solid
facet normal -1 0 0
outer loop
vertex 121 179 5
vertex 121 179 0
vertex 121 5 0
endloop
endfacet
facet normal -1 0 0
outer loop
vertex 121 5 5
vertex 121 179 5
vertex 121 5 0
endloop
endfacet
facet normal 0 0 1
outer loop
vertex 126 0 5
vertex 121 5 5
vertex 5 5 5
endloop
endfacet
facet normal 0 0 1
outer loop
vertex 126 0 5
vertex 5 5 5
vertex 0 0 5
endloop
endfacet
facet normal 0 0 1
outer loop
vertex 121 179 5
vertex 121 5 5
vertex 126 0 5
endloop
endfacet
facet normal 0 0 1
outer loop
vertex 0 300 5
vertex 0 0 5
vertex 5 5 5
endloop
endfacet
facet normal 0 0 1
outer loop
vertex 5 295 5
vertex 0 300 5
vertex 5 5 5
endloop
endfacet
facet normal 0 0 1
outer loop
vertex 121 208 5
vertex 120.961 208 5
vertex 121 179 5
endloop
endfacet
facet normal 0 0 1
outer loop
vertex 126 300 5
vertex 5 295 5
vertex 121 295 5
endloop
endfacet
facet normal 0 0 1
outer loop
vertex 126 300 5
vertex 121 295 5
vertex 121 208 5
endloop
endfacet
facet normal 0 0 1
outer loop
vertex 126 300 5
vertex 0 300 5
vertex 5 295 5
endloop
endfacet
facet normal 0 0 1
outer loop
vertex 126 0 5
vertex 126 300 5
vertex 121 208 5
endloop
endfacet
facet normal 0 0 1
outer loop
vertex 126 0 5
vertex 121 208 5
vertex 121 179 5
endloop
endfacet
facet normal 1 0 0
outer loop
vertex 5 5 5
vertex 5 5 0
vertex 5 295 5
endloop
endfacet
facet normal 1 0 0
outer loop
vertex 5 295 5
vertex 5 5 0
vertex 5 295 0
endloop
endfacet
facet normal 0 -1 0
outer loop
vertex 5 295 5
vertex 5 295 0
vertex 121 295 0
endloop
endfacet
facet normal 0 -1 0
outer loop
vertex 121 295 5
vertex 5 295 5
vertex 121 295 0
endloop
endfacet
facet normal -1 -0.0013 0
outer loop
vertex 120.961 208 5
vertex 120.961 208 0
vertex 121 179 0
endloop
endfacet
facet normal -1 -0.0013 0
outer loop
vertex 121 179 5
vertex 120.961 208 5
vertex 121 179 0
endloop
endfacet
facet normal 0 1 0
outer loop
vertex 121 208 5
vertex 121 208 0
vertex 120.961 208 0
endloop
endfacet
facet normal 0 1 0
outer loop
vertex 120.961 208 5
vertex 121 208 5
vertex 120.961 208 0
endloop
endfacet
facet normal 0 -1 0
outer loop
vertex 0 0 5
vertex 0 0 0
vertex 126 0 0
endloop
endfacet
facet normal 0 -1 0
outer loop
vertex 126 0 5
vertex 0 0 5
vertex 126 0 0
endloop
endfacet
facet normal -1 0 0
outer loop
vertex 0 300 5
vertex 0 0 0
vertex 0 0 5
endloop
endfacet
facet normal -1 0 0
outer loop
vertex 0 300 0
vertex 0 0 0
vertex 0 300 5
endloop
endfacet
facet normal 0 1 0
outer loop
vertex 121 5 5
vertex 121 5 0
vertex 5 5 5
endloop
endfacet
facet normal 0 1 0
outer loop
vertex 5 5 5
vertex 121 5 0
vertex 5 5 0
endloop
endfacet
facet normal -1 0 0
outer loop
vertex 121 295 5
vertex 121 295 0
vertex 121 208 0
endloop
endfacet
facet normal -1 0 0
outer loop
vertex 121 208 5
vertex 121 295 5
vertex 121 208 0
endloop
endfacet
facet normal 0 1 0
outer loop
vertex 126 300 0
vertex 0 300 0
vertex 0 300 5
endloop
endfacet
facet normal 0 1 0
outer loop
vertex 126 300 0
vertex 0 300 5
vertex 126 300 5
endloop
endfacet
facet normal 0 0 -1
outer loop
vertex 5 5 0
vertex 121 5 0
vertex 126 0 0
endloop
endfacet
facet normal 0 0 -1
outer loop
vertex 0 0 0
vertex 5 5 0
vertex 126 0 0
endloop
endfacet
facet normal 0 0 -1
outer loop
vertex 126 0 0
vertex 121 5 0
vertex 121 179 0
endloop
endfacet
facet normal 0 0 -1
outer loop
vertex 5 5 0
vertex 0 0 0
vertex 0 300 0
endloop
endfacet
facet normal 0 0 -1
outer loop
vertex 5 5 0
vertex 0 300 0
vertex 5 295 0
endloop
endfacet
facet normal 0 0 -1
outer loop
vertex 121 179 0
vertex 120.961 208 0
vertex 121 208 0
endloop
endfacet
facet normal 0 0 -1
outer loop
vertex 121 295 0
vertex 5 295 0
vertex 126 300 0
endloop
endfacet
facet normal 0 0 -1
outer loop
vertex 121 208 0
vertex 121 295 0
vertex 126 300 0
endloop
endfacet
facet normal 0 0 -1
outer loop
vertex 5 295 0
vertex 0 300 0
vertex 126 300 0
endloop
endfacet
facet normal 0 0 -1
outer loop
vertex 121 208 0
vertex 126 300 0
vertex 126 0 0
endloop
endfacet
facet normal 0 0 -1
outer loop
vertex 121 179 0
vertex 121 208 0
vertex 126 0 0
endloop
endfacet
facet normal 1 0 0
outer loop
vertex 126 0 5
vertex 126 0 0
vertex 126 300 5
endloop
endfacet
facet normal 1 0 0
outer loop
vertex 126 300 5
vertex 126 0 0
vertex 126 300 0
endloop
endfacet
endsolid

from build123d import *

# Parameters (mm, degrees)
F0_W     = 126
F0_H     = 300
F1_DEPTH = 5


with BuildPart() as f1:
    # F0 (on Top) → F1 (new body)
    with BuildSketch(Plane.XY):
        with Locations((63, 150)):
            Rectangle(F0_W, F0_H)
        Polygon((34, 5), (5, 5), (5, 34), (5, 63), (5, 92), (5, 121), (5, 150), (5, 179), (5, 208), (5, 237), (5, 266), (5, 295), (34, 295), (63, 295), (92, 295), (121, 295), (121, 266), (121, 237), (121, 208), (120.960728, 208), (121, 179), (121, 150), (121, 121), (121, 92), (121, 63), (121, 34), (121, 5), (92, 5), (63, 5), align=None, mode=Mode.SUBTRACT)
    extrude(amount=F1_DEPTH)


solid = f1.part
